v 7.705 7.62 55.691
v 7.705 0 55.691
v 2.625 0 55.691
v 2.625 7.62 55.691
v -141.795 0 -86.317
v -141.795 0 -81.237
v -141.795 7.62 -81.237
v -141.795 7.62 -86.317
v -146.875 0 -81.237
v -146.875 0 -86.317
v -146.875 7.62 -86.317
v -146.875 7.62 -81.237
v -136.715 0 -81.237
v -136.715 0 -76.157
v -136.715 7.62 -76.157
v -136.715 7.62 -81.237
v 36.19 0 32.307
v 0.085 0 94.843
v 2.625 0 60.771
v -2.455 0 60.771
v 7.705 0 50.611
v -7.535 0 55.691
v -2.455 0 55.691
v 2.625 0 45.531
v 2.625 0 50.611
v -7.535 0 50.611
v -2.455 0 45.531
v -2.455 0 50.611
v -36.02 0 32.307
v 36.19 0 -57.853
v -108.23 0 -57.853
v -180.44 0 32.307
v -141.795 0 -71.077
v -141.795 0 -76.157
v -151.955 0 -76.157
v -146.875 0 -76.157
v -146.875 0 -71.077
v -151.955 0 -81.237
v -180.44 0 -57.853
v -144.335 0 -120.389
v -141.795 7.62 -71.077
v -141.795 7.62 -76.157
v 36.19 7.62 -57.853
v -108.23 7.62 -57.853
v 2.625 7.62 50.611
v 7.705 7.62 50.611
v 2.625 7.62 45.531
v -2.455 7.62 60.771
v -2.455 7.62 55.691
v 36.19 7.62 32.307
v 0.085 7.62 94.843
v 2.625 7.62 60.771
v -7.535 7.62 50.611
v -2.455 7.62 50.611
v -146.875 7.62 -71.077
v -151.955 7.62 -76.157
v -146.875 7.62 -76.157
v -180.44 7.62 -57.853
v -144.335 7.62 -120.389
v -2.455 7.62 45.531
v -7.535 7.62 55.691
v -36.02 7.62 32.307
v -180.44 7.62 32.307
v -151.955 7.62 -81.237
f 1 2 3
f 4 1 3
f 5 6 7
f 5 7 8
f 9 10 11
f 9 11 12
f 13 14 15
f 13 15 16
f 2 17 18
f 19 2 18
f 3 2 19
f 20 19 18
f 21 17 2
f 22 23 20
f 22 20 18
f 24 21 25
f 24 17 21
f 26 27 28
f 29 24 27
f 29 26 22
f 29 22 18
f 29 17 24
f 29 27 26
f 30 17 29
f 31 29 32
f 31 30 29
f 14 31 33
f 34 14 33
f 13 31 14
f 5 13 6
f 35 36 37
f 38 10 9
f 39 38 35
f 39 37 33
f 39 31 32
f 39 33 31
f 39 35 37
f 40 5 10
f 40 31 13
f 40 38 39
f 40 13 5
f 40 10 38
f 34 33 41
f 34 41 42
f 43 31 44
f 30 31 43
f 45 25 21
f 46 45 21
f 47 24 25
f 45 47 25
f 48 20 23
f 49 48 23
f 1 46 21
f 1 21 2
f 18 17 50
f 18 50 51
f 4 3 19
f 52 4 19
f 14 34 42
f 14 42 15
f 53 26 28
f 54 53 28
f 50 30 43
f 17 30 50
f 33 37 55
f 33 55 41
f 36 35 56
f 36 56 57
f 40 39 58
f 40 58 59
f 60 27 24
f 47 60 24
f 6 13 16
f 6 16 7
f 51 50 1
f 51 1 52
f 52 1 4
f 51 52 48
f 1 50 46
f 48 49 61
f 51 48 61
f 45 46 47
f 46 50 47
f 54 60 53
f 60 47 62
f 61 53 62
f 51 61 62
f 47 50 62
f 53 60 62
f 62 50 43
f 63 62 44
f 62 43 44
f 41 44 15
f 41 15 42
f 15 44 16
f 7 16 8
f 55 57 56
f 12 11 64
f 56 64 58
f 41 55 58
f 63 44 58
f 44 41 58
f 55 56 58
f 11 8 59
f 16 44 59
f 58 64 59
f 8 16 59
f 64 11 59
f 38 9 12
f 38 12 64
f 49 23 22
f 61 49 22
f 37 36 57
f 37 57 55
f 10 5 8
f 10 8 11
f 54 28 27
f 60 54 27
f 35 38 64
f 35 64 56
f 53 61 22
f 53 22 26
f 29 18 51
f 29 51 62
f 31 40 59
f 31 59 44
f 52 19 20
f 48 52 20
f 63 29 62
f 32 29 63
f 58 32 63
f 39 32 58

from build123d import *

# Parameters (mm, degrees)
BOSS_EXTRUDE1_DEPTH = 7.62


with BuildPart() as part:
    # Sketch1 → Boss-Extrude1 (new body)
    with BuildSketch(Plane(origin=(0, 0, 0), x_dir=(1, 0, 0), z_dir=(0, 1, 0))):
        Polygon((-108.230047059, 57.852952941), (36.189952941, 57.852952941), (36.189952941, -32.306887059), (0.084952941, -94.842581466), (-36.020047059, -32.306887059), (-180.440047059, -32.306887059), (-180.440047059, 57.852952941), (-144.335047059, 120.388647348), align=None)
        Polygon((7.704952941, -50.611397059), (7.704952941, -55.691397059), (2.624952941, -55.691397059), (2.624952941, -60.771397059), (-2.455047059, -60.771397059), (-2.455047059, -55.691397059), (-7.535047059, -55.691397059), (-7.535047059, -50.611397059), (-2.455047059, -50.611397059), (-2.455047059, -45.531397059), (2.624952941, -45.531397059), (2.624952941, -50.611397059), align=None, mode=Mode.SUBTRACT)
        Polygon((-146.875047059, 81.237462941), (-151.955047059, 81.237462941), (-151.955047059, 76.157462941), (-146.875047059, 76.157462941), (-146.875047059, 71.077462941), (-141.795047059, 71.077462941), (-141.795047059, 76.157462941), (-136.715047059, 76.157462941), (-136.715047059, 81.237462941), (-141.795047059, 81.237462941), (-141.795047059, 86.317462941), (-146.875047059, 86.317462941), align=None, mode=Mode.SUBTRACT)
    extrude(amount=BOSS_EXTRUDE1_DEPTH)


solid = part.part
